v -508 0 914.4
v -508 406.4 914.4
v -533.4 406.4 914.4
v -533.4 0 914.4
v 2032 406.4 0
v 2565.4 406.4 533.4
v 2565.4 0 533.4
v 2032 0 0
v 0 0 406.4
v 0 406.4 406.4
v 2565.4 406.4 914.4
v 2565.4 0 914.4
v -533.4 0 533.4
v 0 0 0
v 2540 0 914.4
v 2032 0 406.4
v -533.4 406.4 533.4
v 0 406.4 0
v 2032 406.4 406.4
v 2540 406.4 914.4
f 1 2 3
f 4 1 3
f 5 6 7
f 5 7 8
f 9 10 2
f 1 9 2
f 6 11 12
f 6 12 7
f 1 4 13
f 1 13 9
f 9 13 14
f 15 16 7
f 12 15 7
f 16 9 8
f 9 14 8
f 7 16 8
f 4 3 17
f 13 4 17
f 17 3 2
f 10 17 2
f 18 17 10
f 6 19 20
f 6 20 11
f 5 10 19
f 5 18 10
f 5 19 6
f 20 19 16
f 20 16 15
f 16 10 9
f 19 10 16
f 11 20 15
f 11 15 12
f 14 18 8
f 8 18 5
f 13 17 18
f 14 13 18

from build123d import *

# Parameters (mm, degrees)
SKETCH1_W           = 2032
SKETCH1_H           = 406.4
BOSS_EXTRUDE1_DEPTH = 406.4
BOSS_EXTRUDE2_DEPTH = 406.4


with BuildPart() as part:
    # Sketch1 → Boss-Extrude1 (new body)
    with BuildSketch(Plane.XY):
        with Locations((1016, 203.2)):
            Rectangle(SKETCH1_W, SKETCH1_H)
    extrude(amount=BOSS_EXTRUDE1_DEPTH)

    # Sketch8 → Boss-Extrude2 (add)
    with BuildSketch(Plane(origin=(0, 406.4, 0), x_dir=(1, 0, 0), z_dir=(0, 1, 0))):
        Polygon((0, -406.4), (-508, -914.4), (-533.4, -914.4), (-533.4, -533.4), (0, 0), align=None)
    boss_extrude2 = extrude(amount=-BOSS_EXTRUDE2_DEPTH)

    # Mirror1: Boss-Extrude2 across plane
    add(boss_extrude2.mirror(Plane(origin=(1016, 0, 0), x_dir=(0, 0, 1), z_dir=(1, 0, 0))))


solid = part.part
